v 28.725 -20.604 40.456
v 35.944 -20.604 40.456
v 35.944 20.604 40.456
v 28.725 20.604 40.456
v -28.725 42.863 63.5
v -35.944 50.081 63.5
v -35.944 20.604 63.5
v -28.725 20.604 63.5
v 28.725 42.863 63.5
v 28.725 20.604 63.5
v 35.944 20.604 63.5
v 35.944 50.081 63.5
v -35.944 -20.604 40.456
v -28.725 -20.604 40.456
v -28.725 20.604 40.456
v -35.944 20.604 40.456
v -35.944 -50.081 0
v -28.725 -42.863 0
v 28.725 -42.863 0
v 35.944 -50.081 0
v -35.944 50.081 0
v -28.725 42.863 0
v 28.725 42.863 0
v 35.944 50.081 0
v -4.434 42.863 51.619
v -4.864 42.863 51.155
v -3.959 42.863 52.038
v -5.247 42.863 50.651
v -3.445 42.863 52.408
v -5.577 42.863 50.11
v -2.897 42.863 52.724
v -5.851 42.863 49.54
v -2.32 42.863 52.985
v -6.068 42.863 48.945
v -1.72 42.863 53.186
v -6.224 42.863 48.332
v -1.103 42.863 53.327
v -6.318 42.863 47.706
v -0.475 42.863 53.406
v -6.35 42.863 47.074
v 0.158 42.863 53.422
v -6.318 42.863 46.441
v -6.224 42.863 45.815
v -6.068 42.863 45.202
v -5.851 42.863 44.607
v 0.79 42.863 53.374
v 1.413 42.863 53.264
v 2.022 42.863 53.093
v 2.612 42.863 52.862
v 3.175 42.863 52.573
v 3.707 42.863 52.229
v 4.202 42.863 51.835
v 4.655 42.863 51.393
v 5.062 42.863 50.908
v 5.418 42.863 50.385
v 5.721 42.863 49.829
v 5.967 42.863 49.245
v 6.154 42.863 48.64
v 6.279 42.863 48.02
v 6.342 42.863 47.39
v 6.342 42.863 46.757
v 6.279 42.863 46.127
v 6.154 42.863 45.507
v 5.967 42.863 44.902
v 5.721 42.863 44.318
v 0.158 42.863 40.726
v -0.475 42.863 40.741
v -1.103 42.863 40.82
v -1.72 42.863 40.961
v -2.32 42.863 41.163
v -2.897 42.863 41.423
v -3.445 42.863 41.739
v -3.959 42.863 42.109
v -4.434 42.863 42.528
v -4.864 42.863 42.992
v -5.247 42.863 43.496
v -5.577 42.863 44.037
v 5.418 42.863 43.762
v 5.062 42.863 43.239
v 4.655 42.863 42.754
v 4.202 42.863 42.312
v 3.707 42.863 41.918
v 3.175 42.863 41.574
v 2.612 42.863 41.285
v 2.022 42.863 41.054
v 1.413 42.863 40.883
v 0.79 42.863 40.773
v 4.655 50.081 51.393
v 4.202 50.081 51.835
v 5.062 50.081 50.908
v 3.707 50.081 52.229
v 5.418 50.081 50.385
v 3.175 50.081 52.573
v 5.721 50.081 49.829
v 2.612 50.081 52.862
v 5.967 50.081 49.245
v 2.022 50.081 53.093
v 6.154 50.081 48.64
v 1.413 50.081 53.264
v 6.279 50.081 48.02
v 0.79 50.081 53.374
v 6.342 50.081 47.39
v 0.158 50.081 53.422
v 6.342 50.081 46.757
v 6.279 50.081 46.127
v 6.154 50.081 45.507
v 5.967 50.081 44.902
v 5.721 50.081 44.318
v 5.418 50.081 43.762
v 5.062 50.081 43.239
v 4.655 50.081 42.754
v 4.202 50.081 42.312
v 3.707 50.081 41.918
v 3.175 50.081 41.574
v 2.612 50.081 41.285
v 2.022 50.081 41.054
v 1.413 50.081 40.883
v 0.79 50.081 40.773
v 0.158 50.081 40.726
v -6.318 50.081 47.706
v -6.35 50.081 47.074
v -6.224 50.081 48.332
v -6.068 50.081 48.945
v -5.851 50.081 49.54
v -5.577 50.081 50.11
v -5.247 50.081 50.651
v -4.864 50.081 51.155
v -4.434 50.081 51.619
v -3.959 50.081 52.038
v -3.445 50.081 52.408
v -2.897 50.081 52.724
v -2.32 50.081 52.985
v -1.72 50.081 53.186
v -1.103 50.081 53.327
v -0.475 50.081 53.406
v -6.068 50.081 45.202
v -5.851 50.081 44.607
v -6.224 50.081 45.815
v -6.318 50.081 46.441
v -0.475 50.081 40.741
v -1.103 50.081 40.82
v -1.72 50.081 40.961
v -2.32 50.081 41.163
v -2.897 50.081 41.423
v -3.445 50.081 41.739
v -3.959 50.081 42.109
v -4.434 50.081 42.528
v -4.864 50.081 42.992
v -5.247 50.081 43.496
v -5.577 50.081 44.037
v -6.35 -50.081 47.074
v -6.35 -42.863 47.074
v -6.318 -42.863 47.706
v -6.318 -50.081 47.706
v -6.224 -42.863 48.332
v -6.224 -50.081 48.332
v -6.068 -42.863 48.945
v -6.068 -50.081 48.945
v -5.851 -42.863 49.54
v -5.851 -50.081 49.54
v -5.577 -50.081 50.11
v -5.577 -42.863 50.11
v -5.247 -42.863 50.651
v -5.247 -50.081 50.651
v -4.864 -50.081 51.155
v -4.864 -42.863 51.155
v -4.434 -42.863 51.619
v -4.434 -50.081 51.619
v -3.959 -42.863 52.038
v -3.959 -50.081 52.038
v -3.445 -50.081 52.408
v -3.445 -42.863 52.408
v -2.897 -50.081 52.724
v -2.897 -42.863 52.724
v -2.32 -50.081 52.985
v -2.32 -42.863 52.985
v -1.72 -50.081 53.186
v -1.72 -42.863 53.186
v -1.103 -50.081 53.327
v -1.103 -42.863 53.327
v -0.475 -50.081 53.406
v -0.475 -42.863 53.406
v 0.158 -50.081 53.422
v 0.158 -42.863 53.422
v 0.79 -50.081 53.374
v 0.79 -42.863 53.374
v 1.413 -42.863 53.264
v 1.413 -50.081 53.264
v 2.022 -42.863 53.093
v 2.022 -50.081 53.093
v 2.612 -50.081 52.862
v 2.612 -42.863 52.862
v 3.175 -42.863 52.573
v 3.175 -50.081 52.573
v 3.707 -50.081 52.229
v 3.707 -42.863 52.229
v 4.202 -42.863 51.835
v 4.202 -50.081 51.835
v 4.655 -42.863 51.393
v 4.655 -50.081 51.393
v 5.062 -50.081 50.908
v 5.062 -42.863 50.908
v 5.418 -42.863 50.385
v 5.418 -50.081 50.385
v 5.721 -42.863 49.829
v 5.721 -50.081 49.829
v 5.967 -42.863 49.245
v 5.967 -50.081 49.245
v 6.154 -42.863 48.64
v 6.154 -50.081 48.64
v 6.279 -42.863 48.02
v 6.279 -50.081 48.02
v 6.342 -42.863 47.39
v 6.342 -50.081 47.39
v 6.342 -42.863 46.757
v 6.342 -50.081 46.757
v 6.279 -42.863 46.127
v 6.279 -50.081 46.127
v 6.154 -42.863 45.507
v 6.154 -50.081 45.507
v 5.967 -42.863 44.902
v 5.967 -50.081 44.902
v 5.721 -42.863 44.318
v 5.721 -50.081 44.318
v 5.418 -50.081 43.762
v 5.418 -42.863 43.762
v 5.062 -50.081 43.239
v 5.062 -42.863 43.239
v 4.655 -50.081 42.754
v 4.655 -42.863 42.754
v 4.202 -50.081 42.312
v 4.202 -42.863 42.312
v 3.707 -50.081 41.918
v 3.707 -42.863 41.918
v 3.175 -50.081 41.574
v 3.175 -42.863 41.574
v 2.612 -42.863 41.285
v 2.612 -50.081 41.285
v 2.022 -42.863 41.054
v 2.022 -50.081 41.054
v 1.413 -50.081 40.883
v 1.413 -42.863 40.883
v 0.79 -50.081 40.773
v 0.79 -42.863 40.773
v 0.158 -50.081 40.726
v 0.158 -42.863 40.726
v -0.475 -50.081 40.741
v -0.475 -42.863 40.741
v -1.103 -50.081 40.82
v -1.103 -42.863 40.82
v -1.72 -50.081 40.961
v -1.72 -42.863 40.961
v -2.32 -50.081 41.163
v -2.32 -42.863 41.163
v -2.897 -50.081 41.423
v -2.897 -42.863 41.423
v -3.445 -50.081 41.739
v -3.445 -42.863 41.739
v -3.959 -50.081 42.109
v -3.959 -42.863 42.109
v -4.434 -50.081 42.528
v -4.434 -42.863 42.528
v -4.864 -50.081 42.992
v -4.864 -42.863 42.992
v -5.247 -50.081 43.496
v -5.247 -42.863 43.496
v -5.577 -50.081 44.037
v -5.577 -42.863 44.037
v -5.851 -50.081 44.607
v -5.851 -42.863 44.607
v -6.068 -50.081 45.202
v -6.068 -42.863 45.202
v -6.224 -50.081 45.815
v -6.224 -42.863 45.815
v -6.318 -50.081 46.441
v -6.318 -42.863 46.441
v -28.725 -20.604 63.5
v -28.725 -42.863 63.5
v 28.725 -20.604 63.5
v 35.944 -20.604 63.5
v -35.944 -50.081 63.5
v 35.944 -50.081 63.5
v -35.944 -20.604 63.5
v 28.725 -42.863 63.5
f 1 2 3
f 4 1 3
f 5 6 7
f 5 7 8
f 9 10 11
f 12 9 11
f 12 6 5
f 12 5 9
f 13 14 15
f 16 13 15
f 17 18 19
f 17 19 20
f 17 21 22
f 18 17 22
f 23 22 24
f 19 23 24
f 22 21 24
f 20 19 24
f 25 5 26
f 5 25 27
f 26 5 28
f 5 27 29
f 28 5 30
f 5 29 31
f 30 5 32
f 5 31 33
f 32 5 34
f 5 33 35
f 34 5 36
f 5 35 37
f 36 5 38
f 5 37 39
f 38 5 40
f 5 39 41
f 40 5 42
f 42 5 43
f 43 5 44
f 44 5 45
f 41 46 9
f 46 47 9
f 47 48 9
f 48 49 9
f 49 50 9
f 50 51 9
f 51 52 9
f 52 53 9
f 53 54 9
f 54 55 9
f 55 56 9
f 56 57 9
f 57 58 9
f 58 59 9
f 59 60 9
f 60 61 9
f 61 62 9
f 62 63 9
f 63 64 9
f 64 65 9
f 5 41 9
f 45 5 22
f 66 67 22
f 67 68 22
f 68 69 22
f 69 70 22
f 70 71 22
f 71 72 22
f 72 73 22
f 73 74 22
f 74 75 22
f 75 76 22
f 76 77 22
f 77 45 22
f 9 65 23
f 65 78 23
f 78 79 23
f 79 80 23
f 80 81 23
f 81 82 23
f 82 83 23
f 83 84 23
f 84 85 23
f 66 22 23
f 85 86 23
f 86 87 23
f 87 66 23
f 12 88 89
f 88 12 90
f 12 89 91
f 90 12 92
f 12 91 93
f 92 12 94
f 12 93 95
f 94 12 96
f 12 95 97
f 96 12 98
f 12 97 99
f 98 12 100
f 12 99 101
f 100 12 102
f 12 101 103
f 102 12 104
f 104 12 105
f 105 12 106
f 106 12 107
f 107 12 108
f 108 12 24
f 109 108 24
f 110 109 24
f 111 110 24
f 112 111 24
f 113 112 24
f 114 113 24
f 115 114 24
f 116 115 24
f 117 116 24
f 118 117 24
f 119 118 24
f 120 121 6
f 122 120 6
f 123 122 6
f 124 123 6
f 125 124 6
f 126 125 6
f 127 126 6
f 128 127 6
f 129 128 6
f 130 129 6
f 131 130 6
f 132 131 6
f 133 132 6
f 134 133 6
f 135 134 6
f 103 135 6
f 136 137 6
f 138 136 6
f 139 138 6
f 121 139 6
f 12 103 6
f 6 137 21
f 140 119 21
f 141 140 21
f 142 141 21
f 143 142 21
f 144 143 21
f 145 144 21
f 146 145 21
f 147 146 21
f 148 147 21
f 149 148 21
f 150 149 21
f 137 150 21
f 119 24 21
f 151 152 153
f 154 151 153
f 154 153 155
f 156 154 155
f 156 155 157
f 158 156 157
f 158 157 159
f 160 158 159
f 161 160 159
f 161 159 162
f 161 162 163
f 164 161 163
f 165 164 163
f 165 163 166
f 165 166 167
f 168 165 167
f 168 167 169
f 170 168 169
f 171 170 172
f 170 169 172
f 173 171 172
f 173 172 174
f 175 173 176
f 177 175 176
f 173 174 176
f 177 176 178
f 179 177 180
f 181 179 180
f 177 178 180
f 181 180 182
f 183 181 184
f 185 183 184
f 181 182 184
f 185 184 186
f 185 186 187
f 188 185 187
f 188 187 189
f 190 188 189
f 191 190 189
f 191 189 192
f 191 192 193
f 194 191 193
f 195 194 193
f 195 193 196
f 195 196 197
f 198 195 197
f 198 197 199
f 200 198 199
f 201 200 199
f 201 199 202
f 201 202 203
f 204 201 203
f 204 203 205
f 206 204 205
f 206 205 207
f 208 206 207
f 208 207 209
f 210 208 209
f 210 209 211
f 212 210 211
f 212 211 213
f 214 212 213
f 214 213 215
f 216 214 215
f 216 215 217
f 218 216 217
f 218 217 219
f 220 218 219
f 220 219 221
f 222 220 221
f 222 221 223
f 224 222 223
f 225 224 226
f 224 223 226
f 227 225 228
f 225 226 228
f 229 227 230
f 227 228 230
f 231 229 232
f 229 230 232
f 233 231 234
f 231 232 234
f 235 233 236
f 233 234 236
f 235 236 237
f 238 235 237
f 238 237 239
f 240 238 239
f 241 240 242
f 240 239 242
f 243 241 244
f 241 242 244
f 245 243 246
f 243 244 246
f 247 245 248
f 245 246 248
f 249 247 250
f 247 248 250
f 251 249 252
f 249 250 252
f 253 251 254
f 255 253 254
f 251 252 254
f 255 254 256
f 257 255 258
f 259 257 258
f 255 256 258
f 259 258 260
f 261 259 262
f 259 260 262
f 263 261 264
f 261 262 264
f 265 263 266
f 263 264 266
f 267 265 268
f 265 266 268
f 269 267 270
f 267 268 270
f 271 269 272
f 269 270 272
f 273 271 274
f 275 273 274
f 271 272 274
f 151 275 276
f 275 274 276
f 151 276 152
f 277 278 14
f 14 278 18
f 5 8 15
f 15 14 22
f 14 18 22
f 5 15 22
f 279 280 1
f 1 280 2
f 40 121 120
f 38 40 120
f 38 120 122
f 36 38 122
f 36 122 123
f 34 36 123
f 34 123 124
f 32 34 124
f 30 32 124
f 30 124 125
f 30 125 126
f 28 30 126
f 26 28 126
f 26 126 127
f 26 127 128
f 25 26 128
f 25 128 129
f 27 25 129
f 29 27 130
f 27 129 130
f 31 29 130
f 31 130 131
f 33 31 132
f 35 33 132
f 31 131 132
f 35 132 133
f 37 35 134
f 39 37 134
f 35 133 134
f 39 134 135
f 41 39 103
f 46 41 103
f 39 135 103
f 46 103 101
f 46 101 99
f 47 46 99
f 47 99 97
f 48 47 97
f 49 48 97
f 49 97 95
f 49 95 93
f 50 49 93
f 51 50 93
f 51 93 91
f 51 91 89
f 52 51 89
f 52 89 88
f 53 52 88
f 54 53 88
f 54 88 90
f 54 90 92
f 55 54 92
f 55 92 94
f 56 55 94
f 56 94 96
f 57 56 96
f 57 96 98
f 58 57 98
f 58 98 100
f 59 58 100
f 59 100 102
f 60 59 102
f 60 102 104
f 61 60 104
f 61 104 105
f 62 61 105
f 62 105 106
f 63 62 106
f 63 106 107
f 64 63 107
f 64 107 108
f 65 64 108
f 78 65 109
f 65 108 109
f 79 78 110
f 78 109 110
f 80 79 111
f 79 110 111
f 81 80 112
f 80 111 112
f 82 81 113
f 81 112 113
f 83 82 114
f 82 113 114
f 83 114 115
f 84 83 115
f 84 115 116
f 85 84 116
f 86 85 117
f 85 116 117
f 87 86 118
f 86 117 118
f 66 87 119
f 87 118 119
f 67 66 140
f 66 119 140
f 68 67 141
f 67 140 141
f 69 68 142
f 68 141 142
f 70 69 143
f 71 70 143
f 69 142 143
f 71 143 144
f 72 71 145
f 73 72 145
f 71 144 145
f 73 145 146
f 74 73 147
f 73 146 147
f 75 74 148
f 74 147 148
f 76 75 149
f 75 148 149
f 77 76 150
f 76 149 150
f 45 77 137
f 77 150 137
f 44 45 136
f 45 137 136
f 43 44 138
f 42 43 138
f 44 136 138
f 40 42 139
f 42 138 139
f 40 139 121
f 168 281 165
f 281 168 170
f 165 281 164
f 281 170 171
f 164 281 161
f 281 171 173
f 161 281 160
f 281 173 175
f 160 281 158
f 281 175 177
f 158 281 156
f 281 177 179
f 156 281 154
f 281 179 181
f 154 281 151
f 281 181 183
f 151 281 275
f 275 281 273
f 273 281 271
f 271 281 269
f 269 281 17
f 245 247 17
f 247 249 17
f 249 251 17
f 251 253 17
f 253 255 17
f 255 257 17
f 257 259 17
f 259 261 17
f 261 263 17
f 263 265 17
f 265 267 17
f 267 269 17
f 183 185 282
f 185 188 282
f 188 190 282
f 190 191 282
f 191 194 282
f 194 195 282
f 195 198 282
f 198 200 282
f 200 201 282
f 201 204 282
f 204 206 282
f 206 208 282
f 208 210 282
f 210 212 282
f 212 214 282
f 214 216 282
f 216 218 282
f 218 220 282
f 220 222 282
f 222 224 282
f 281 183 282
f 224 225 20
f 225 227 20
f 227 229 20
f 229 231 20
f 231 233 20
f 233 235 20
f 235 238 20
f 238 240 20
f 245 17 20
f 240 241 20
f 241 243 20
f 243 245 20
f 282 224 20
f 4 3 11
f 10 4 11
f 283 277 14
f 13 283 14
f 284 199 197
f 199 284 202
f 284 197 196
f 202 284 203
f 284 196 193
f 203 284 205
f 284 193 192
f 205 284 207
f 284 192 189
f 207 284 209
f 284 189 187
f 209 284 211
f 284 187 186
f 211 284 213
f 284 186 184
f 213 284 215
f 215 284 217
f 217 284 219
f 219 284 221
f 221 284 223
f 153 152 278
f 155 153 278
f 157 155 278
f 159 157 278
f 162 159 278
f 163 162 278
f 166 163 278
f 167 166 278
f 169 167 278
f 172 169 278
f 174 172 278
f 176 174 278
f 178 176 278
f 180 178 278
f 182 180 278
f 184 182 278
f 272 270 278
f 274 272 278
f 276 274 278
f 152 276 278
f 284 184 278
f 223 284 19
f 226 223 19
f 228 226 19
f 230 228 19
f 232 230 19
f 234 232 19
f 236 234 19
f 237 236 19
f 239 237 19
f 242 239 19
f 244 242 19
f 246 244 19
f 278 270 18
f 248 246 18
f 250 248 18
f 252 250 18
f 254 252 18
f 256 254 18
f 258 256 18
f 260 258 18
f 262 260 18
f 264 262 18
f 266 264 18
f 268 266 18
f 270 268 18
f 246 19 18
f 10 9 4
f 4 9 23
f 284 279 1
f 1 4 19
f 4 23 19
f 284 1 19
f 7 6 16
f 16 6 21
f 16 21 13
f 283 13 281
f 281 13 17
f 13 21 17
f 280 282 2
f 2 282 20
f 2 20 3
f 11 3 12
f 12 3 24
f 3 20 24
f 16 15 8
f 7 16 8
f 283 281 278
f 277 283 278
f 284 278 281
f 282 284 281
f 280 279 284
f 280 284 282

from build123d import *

# Parameters (mm, degrees)
F1_DEPTH = 63.5
F3_DEPTH = 127
F5_D     = 12.7


with BuildPart() as f1:
    # F0 (on Top) → F1 (new body)
    with BuildSketch(Plane.XY):
        Polygon((-35.944343, 50.081447), (-35.944343, 0), (-35.944343, -50.081447), (0, -50.081447), (35.944343, -50.081447), (35.944343, 0), (35.944343, 50.081447), (0, 50.081447), align=None)
        Polygon((-28.725395, -42.862501), (-28.725395, 0), (-28.725395, 42.862501), (0, 42.862501), (28.725395, 42.862501), (28.725395, 0), (28.725395, -42.862501), (0, -42.862501), align=None, mode=Mode.SUBTRACT)
    extrude(amount=F1_DEPTH)

    # F2 (on face) → F3 (cut)
    with BuildSketch(Plane.YZ.offset(35.944343)):
        Polygon((20.60408, 63.5), (-20.60408, 63.5), (-20.60408, 40.456183), (0, 40.456183), (20.60408, 40.456183), align=None)
    extrude(amount=-F3_DEPTH, mode=Mode.SUBTRACT)

    # F5 (through all)
    with Locations(Plane.XZ.offset(50.081447)):
        with Locations((0, 47.073554)):
            Hole(F5_D / 2)


solid = f1.part
